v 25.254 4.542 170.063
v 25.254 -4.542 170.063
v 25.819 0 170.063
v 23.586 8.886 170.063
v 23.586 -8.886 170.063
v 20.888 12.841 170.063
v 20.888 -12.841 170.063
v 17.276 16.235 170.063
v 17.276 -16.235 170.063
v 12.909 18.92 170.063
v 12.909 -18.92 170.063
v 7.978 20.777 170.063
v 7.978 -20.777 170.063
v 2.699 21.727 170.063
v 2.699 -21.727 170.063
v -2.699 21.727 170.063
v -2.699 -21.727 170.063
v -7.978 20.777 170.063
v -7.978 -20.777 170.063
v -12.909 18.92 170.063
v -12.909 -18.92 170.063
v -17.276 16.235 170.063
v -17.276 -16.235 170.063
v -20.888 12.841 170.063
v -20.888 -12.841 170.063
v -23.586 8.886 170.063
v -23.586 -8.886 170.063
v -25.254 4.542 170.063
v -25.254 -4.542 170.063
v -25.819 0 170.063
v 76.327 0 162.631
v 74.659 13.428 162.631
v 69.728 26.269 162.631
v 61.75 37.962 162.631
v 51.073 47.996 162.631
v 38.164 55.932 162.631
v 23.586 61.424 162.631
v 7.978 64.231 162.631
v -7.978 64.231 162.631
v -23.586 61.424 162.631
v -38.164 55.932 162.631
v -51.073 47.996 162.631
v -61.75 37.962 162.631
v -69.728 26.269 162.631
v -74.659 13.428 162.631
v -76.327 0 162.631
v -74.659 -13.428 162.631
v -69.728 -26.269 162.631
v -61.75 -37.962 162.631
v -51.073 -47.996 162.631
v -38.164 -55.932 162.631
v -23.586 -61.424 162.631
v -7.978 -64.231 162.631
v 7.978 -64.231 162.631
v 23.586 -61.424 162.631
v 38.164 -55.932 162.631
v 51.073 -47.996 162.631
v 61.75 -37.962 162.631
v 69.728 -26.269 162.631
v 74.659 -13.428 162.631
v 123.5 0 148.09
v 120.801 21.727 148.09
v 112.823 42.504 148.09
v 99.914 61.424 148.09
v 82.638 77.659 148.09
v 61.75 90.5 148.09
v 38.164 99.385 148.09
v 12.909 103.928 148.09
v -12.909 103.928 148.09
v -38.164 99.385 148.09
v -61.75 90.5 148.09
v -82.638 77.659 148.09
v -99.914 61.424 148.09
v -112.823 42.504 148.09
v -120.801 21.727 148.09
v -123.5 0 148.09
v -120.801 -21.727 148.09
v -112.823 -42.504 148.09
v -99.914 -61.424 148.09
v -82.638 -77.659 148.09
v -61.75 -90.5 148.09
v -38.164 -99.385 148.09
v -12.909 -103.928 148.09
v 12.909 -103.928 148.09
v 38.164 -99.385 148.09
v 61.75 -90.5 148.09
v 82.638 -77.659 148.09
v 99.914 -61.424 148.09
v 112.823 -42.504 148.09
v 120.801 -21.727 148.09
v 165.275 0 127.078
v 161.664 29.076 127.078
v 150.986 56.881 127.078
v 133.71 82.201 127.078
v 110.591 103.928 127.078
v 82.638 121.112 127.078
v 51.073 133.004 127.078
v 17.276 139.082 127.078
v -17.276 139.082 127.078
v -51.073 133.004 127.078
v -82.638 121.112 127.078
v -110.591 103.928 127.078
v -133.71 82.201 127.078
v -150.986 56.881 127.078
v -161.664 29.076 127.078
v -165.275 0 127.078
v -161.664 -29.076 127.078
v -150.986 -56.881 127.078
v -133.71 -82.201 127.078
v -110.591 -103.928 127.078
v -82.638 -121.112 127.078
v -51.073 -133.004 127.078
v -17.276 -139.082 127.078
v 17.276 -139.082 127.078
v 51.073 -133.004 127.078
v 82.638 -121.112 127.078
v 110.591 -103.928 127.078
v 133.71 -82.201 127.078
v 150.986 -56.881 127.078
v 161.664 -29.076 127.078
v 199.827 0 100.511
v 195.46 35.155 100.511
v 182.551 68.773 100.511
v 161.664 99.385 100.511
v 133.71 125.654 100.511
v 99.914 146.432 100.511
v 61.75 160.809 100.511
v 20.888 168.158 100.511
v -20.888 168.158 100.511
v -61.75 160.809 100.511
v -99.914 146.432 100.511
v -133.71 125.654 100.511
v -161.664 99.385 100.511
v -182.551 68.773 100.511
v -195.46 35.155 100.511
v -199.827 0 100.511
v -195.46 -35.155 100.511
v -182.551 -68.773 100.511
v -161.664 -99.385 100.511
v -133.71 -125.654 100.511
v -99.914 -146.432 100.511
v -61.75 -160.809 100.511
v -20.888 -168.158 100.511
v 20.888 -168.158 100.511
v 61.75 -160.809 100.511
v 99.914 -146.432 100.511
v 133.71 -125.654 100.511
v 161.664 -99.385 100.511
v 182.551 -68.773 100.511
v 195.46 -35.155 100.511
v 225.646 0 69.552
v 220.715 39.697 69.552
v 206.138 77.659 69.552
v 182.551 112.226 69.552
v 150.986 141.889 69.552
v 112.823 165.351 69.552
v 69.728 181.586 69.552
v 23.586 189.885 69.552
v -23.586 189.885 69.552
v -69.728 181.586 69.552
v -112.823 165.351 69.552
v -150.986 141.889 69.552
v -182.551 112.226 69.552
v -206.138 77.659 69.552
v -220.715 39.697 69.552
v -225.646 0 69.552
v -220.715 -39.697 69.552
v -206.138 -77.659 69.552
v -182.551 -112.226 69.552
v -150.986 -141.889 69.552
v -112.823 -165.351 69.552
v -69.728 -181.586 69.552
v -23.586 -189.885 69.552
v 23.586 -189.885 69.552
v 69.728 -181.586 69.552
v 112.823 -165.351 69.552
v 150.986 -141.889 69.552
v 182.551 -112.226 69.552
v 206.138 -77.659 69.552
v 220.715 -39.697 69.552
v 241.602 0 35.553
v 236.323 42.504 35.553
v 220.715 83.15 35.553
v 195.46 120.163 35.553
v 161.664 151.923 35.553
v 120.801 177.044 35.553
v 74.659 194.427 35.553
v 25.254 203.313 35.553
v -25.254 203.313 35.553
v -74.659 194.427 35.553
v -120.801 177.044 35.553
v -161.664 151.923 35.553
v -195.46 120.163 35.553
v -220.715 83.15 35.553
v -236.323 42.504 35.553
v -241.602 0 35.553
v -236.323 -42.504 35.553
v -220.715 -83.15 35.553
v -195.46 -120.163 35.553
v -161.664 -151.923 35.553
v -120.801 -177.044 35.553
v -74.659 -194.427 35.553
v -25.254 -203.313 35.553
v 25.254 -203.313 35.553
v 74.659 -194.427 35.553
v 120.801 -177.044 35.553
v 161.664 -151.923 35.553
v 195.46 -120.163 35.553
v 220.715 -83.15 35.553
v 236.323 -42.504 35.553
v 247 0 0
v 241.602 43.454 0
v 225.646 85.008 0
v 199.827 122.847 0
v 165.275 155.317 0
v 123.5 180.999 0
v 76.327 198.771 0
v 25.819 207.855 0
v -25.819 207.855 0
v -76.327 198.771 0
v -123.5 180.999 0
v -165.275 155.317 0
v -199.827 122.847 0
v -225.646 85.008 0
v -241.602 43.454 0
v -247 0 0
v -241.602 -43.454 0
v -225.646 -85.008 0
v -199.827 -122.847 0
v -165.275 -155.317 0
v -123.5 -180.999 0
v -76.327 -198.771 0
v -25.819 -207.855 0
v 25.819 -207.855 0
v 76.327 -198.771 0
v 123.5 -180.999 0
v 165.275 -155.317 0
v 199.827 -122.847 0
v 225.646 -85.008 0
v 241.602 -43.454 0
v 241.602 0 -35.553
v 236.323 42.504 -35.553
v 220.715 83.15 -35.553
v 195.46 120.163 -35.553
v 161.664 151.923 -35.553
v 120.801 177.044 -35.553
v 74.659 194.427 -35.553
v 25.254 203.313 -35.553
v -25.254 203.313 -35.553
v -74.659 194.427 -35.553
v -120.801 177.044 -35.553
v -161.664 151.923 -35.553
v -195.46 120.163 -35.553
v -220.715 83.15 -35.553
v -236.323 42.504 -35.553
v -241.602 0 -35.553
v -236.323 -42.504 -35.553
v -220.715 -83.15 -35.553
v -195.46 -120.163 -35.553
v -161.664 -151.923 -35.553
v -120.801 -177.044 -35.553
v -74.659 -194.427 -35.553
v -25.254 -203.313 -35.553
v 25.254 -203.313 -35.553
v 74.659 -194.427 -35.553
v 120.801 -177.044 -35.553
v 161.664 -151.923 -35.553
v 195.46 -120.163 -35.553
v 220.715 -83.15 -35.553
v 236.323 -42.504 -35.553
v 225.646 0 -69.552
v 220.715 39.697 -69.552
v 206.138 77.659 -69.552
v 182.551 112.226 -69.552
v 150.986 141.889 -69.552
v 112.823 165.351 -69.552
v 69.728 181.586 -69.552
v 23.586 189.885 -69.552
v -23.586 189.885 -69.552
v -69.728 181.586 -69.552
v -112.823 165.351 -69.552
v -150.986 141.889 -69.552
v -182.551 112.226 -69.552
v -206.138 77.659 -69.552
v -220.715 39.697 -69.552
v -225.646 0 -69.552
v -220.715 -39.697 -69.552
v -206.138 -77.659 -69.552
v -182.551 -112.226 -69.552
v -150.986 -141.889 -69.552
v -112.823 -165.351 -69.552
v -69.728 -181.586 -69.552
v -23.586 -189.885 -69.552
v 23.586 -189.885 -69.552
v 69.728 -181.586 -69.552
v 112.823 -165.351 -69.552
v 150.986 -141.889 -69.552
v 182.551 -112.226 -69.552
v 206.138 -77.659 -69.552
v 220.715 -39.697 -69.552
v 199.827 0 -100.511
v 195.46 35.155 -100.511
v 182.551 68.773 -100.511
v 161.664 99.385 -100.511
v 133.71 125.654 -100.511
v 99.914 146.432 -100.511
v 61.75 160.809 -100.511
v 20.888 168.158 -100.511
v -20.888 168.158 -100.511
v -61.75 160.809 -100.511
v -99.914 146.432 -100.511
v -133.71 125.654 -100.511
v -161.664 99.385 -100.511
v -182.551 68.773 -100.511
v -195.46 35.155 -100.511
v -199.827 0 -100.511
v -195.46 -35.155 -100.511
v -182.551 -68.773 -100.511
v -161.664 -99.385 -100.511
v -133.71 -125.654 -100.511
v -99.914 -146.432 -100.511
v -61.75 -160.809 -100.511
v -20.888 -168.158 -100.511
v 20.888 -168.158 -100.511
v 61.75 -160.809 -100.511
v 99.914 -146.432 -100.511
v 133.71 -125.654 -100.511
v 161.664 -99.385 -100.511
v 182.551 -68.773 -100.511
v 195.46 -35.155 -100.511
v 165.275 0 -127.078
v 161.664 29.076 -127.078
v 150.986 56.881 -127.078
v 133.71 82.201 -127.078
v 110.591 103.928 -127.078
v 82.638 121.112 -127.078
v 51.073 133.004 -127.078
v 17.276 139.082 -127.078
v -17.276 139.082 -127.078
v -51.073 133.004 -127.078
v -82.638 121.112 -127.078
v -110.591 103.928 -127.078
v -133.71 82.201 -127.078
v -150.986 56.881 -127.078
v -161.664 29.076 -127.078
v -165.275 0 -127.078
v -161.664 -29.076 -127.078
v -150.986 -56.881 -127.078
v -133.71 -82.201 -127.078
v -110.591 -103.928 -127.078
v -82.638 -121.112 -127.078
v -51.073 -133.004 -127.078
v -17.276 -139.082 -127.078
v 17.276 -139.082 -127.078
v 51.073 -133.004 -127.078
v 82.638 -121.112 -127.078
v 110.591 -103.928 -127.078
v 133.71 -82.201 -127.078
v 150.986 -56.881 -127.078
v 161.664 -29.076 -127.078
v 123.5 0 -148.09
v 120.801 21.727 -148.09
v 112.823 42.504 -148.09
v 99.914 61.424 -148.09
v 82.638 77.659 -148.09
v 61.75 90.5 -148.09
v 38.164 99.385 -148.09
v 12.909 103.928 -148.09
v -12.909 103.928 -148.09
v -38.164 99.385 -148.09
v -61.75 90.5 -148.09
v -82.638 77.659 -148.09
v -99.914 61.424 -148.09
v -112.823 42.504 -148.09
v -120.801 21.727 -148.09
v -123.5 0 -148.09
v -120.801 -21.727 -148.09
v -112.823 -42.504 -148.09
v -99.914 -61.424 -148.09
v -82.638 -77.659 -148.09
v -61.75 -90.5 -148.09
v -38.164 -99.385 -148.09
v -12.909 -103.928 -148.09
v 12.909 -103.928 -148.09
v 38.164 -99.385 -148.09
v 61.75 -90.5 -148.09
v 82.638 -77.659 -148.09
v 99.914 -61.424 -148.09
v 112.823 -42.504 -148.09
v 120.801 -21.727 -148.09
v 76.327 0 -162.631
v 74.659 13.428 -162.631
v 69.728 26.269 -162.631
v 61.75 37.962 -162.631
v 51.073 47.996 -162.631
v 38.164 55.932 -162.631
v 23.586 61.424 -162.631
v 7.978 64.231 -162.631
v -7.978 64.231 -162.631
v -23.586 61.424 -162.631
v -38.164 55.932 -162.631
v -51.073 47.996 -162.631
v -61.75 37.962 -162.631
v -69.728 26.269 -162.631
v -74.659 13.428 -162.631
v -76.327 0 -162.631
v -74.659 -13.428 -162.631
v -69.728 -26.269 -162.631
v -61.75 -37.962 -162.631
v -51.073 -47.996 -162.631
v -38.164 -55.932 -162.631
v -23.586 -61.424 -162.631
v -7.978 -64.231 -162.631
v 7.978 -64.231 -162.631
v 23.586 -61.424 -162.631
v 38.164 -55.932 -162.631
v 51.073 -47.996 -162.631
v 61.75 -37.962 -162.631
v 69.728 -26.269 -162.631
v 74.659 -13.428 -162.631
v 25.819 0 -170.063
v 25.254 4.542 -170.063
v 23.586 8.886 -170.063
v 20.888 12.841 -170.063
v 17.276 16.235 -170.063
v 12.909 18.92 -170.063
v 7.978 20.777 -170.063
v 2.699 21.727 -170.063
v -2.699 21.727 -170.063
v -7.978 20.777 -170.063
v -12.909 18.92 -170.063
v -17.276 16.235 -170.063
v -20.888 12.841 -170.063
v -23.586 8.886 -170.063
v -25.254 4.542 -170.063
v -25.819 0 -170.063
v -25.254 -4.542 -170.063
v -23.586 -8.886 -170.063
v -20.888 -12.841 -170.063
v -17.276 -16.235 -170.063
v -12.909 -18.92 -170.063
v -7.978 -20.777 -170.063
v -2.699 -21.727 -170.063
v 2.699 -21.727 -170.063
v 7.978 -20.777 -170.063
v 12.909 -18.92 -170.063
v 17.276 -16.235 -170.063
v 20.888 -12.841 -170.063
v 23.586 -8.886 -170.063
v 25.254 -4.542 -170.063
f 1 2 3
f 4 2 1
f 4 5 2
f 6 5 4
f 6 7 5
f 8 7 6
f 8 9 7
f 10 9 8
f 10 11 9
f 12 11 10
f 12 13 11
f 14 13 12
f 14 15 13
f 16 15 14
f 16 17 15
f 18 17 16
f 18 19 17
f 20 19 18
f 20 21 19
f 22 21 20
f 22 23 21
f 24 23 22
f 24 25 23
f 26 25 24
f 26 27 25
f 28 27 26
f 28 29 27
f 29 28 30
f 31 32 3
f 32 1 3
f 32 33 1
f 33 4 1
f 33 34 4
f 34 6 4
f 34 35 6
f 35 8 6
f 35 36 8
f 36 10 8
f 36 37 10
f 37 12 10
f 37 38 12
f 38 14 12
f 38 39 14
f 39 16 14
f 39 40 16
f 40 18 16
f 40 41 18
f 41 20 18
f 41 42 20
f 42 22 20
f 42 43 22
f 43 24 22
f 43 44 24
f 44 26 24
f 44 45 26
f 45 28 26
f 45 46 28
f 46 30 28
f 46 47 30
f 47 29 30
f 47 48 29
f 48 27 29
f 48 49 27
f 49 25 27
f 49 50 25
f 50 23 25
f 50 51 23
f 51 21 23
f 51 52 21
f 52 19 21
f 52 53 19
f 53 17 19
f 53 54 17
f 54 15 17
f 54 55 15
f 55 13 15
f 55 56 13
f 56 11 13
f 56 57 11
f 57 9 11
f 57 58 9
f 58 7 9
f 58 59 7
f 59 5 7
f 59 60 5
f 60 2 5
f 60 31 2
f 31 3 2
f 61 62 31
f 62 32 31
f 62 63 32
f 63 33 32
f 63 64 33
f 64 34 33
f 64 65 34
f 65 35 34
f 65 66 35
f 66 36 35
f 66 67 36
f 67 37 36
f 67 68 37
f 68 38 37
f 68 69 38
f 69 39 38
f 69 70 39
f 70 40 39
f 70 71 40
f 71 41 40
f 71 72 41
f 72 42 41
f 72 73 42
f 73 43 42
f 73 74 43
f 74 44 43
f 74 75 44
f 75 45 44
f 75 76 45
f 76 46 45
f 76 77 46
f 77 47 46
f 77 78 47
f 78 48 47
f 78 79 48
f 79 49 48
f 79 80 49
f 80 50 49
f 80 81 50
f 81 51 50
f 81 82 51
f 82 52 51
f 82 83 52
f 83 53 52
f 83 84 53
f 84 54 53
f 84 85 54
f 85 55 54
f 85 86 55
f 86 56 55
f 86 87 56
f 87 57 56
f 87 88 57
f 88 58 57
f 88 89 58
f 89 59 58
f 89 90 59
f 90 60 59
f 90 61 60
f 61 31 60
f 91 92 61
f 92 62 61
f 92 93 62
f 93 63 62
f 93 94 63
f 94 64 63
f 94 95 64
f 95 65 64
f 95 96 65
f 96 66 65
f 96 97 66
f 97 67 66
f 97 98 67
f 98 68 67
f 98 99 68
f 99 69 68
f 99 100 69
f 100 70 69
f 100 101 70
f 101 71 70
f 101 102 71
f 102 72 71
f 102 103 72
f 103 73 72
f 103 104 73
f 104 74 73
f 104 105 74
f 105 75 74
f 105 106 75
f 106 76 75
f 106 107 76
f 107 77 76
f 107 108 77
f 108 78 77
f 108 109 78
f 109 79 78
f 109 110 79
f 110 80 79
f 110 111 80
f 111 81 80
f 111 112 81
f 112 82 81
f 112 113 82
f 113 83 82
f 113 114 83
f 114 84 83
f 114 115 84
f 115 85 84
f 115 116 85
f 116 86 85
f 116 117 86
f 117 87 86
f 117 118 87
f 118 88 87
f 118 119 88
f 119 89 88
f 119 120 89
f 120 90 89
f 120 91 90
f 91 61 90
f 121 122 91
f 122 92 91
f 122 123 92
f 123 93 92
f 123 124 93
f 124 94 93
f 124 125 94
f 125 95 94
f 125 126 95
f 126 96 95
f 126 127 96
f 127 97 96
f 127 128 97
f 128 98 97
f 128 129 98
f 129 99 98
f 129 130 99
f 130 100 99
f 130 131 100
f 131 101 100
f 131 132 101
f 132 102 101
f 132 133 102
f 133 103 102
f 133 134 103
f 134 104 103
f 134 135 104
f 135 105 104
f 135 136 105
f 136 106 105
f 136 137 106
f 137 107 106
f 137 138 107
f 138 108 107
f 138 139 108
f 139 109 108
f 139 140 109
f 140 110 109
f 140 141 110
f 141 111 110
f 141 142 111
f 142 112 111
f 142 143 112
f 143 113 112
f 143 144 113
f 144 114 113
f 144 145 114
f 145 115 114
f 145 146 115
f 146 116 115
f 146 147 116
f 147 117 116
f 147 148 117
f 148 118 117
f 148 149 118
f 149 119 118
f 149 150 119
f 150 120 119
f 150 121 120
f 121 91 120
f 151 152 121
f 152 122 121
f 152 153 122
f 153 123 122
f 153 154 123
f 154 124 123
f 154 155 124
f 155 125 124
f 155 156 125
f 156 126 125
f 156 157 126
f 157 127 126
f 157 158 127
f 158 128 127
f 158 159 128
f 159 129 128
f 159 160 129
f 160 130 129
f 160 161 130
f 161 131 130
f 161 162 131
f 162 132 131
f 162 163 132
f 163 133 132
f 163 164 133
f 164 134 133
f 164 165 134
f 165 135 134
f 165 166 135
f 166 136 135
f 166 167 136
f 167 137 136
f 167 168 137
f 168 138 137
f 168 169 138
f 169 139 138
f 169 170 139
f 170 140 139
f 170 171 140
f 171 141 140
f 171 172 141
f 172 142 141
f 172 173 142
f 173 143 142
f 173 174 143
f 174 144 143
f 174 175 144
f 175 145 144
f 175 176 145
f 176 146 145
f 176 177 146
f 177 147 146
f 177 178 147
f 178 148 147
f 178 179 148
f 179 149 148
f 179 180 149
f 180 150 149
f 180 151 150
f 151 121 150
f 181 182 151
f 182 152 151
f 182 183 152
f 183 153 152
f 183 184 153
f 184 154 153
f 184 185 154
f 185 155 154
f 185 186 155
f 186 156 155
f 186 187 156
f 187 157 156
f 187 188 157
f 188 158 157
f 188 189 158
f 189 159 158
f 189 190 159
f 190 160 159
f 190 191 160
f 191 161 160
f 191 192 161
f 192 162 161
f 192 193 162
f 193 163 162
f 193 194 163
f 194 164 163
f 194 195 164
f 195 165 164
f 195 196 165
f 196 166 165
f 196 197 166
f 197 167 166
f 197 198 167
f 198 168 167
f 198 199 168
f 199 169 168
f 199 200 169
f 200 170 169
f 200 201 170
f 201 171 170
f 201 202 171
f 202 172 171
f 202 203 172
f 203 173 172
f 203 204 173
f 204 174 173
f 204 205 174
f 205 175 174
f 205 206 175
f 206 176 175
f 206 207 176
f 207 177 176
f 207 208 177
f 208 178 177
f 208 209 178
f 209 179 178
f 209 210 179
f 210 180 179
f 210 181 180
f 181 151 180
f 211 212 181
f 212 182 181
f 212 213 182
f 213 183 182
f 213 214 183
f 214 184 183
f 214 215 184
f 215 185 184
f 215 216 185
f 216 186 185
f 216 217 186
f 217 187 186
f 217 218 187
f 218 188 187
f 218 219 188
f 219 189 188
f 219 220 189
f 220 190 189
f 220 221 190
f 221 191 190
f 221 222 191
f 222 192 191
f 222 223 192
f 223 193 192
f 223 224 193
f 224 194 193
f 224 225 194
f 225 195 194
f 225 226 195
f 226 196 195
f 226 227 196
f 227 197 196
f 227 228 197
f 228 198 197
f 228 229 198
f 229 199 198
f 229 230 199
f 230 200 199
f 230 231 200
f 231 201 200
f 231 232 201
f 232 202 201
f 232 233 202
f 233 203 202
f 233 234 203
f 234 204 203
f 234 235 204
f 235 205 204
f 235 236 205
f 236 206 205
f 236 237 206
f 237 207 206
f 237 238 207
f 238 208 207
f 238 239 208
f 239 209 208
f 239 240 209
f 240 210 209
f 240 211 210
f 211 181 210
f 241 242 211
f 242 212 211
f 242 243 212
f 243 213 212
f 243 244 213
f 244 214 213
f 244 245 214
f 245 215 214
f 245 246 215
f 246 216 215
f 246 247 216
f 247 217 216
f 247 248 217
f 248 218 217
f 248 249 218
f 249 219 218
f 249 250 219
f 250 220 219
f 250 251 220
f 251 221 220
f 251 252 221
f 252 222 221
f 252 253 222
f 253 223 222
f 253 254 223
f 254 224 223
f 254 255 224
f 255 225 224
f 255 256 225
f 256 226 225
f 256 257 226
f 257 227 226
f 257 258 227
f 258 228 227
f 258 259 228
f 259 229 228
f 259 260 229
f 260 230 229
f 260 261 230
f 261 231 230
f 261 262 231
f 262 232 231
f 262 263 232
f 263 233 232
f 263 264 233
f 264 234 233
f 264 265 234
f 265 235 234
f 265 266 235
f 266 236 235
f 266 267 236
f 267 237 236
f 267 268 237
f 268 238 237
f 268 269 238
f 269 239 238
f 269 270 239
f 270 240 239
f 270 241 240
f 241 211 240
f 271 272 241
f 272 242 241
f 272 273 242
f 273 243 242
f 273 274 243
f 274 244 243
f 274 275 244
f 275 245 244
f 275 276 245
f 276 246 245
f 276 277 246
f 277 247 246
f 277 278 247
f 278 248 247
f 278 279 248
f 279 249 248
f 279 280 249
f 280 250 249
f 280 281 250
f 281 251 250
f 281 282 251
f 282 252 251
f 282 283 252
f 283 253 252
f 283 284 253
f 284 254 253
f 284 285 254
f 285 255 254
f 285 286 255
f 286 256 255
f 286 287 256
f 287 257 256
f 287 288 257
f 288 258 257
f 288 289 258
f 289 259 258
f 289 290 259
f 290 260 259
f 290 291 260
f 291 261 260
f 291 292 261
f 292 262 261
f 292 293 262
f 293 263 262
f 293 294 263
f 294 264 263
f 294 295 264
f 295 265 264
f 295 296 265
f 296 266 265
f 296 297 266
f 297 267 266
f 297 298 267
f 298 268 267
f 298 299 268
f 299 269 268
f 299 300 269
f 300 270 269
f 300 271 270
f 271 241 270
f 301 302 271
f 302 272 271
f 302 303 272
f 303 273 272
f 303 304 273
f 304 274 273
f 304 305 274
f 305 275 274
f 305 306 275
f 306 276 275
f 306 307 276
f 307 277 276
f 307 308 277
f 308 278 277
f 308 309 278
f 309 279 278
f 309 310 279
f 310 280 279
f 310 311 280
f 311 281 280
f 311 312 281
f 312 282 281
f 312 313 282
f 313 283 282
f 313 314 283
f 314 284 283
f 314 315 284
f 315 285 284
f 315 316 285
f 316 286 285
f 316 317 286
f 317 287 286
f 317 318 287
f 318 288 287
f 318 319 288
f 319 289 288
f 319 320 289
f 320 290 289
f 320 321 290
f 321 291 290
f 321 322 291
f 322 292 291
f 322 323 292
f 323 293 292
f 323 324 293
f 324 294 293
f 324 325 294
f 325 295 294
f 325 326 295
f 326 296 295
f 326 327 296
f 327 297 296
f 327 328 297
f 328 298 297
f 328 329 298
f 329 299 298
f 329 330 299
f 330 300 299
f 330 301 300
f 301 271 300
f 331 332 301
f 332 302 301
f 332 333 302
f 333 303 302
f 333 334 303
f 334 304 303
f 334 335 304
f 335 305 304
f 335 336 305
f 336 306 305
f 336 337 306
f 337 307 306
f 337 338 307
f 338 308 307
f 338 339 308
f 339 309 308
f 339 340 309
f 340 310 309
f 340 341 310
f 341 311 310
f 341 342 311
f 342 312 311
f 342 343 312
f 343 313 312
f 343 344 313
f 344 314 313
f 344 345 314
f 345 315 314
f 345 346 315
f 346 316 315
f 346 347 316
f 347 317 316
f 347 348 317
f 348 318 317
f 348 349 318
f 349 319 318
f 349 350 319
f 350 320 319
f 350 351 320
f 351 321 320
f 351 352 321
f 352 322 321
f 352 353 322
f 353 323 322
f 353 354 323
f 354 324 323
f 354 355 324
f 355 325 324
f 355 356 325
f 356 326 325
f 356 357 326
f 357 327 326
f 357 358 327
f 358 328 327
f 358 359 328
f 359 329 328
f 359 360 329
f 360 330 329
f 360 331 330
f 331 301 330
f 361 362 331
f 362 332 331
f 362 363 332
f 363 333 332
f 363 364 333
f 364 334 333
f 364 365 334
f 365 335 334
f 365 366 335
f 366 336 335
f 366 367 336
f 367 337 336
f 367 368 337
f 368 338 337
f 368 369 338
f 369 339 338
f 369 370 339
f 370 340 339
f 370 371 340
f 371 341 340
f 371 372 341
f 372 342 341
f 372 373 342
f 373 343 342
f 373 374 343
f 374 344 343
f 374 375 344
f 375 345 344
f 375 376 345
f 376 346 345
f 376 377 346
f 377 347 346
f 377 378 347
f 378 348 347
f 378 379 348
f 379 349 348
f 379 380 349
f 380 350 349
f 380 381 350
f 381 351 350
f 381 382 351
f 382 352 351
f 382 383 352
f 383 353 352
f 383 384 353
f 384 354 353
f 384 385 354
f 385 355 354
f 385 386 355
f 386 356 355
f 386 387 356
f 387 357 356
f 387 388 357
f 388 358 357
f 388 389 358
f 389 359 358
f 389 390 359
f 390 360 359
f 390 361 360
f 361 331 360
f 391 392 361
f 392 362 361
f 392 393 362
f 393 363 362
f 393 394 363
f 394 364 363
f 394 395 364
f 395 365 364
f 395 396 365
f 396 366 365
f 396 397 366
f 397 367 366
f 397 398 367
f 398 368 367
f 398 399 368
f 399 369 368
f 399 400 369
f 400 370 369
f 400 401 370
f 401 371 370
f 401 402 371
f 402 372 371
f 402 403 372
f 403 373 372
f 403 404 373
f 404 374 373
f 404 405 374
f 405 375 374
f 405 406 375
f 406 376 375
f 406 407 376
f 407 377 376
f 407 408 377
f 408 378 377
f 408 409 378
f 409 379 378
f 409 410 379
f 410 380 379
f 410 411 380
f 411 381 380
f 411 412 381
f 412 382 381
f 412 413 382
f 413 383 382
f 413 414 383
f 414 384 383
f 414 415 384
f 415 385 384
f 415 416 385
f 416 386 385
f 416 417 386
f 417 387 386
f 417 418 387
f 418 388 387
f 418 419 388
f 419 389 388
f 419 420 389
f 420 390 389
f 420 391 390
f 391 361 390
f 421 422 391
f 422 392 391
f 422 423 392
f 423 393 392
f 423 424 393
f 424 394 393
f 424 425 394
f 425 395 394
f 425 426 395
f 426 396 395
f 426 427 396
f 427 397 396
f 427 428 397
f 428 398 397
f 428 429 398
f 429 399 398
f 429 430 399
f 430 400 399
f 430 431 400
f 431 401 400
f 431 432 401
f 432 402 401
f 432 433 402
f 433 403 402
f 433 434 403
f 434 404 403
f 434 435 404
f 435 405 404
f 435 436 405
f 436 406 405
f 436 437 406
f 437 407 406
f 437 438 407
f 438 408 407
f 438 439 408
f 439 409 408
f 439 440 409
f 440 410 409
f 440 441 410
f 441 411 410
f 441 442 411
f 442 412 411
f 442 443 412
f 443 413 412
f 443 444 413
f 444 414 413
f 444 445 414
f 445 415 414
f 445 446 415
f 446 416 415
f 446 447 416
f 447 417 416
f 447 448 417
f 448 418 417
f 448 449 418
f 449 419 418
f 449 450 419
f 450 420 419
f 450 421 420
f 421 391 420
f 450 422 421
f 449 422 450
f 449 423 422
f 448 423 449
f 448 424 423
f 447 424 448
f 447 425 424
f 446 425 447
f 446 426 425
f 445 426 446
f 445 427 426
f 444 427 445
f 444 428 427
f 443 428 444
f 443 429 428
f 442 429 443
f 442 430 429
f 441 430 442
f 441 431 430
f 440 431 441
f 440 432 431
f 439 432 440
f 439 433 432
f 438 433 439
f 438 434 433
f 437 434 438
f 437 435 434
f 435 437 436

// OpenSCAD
// Generated by SolidPython 1.0.1 on 2020-07-29 00:46:51


scale(v = [13, 11, 9]) {
	sphere(r = 19);
}
/***********************************************
*********      SolidPython code:      **********
************************************************
 
# import packages: SolidPython
from solid import *
from solid.utils import *
from itertools import chain, combinations, permutations


class Resize:

    def __init__(self, scad_file):
        self.scad_file = scad_file
        #self.scad_file = import_scad(scad_file)
        # cone/cylinder param:
        self.r1 = 0
        self.r2 = 0
        self.h = 0
        # rectangular prism param:
        self.w = 0
        self.l = 0
        # ellipse param:
        self.r = 0

    # import OpenScad code (file name corresponds to shape)


    # classify shape + parameters
    def assign(self, param1, param2, param3):
        if self.scad_file == 'cone.scad':
            self.r1 = param1
            self.r2 = param2
            self.h = param3
        elif self.scad_file == 'cylinder.scad':
            self.r1 = param1
            self.r2 = param2
            self.h = param3
        elif self.scad_file == 'rectangularPrism.scad':
            self.h = param1
            self.l = param2
            self.w = param3
        else:
            self.r = param1
            self.h = param2

    # resize parameters
    def iterate(self):
        x = range(3, 20, 2)
        i = 1
        if self.scad_file == 'cone.scad':
            tempList = list(permutations(x, 2))
            for temp in tempList:
                param1 = temp[0]
                param2 = temp[1]
                filepath = 'produced_scad_files/' + 'cone' + str(param1) + '_' + str(param2) + '_' + '.scad'
                scad_render_to_file(cylinder(h=param1, r1=param2, r2=0), filepath)

        elif self.scad_file == 'cylinder.scad':
            tempList = list(permutations(x, 3))
            for temp in tempList:
                param1 = temp[0]
                param2 = temp[1]
                filepath = 'produced_scad_files/' + 'cylinder' + str(param1) + '_' + str(param2) + '_' + '.scad'
                scad_render_to_file(cylinder(h=param1, r1=param2, r2=param2), filepath)

        elif self.scad_file == 'rectangularPrism.scad':
            tempList = list(permutations(x, 3))
            for temp in tempList:
                param1 = temp[0]
                param2 = temp[1]
                param3 = temp[2]
                filepath = 'produced_scad_files/' + 'rectangularPrism' + str(param1) + '_' + str(param2) + '_' + str(
                    param3) + '.scad'
                scad_render_to_file(cube(size=(param1, param2, param3)), filepath)

        elif self.scad_file == 'ellipse.scad':
            tempList = list(permutations(x, 4))
            for temp in tempList:
                param1 = temp[0]
                param2 = temp[1]
                param3 = temp[2]
                param4 = temp[3]
                filepath = 'produced_scad_files/' + 'ellipse' + str(param1) + '_' + str(param2) + '_' + str(param3) + '_' + str(param4) + '.scad'
                scad_render_to_file(scale([param1, param2, param3])(sphere(r=param4)), filepath)

    def render_to_scadfile(self):
        scad_render_to_file(scad, 'example.scad') 
 
************************************************/
